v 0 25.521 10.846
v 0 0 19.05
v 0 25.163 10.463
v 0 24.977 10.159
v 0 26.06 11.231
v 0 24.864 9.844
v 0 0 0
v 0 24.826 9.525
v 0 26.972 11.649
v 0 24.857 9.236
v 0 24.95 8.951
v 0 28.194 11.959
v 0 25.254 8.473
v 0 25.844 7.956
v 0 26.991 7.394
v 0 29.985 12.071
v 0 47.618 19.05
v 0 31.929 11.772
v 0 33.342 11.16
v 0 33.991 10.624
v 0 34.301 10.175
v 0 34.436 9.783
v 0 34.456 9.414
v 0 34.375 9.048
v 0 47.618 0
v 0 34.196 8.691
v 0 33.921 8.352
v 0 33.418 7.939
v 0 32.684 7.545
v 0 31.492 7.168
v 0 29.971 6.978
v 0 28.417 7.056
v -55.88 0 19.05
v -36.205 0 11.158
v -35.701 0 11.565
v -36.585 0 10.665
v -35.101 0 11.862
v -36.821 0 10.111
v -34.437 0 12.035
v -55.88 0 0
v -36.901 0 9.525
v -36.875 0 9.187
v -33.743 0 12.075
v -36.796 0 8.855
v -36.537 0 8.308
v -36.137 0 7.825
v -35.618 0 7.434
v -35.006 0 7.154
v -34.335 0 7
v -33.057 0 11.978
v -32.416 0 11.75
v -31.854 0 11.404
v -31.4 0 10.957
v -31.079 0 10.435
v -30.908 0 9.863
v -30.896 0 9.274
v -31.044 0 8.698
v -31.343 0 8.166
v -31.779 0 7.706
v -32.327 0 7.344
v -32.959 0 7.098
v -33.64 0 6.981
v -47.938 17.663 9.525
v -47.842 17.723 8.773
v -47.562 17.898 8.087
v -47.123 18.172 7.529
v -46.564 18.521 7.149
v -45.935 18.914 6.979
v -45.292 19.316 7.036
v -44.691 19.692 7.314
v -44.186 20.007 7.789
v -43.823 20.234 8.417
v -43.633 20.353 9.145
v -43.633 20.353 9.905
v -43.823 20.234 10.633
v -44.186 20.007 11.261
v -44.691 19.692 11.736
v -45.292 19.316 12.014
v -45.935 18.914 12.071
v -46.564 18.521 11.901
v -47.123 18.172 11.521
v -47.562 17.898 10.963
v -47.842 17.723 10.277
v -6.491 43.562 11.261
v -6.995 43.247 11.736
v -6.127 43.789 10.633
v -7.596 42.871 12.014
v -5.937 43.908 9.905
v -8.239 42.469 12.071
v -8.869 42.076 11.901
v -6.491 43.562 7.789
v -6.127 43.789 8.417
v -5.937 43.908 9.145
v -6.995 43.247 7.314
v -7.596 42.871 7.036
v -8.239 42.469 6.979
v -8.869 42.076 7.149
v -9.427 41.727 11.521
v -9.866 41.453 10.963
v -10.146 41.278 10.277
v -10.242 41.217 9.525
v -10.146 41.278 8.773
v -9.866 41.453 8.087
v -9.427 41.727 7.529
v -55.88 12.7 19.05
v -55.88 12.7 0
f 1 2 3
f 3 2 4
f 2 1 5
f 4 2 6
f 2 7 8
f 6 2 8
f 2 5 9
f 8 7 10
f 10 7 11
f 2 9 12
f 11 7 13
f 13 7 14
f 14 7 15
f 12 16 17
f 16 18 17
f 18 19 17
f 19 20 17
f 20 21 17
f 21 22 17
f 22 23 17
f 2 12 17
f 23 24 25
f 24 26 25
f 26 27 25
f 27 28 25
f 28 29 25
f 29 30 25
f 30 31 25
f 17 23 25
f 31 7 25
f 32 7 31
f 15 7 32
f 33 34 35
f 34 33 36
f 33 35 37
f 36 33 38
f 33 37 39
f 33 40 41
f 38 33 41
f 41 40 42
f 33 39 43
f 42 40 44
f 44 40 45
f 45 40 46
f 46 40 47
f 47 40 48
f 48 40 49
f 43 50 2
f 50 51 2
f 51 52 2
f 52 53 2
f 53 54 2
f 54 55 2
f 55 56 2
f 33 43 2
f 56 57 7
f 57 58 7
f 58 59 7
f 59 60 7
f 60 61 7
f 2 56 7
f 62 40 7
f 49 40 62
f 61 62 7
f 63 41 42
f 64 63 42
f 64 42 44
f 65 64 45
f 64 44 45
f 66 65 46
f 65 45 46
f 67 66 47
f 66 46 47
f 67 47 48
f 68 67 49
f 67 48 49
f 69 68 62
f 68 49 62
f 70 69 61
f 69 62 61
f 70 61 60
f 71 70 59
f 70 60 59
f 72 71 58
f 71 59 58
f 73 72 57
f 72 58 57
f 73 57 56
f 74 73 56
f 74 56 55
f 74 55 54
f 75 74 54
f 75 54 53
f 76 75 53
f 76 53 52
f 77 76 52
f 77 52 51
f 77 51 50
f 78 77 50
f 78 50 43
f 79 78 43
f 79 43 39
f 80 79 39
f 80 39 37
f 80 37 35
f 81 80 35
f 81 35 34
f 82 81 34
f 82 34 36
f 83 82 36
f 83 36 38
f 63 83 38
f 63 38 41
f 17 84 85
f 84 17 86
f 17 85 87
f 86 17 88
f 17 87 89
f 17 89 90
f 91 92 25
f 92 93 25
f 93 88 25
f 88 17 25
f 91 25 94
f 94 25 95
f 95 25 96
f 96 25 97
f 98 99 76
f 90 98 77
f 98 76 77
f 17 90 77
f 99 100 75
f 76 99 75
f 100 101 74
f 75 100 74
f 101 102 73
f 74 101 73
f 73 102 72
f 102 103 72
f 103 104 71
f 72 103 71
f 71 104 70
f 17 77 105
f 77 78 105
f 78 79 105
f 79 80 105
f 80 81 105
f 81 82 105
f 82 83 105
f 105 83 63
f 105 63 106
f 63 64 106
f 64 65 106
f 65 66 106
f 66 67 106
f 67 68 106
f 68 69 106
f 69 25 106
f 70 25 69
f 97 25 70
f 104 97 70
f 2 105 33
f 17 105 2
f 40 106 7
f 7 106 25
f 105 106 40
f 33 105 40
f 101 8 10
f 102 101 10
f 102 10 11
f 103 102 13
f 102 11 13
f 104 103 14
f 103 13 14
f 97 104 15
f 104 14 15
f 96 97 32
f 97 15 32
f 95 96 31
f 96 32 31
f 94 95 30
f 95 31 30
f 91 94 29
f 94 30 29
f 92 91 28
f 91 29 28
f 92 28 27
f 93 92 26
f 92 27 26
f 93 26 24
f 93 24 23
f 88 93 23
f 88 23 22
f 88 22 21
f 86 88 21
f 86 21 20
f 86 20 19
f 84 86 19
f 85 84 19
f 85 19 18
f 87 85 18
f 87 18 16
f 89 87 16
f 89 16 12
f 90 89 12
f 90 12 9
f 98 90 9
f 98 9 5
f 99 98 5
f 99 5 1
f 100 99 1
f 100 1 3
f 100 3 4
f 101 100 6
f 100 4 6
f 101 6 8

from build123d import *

# Parameters (mm, degrees)
BOSS_EXTRUDE1_DEPTH            = 19.05
F_7_0_201_DIAMETER_HOLE1_D     = 5.1054
F_7_0_201_DIAMETER_HOLE1_DEPTH = 25.4


with BuildPart() as part:
    # Sketch2 → Boss-Extrude1 (new body)
    with BuildSketch(Plane.XY):
        Polygon((0, 47.617699385), (-55.88, 12.7), (-55.88, 0), (0, 0), align=None)
    extrude(amount=BOSS_EXTRUDE1_DEPTH)

    # #7 (0.201) Diameter Hole1
    with Locations(Plane(origin=(-21.399252353, 34.245962436, 0), x_dir=(0.8480480961564308, 0.5299192642331972, 0), z_dir=(-0.5299192642331972, 0.848048096156431, 0))):
        with Locations((-28.741463778, -9.525), (15.708536222, -9.525)):
            Hole(F_7_0_201_DIAMETER_HOLE1_D / 2, depth=F_7_0_201_DIAMETER_HOLE1_DEPTH)


solid = part.part
